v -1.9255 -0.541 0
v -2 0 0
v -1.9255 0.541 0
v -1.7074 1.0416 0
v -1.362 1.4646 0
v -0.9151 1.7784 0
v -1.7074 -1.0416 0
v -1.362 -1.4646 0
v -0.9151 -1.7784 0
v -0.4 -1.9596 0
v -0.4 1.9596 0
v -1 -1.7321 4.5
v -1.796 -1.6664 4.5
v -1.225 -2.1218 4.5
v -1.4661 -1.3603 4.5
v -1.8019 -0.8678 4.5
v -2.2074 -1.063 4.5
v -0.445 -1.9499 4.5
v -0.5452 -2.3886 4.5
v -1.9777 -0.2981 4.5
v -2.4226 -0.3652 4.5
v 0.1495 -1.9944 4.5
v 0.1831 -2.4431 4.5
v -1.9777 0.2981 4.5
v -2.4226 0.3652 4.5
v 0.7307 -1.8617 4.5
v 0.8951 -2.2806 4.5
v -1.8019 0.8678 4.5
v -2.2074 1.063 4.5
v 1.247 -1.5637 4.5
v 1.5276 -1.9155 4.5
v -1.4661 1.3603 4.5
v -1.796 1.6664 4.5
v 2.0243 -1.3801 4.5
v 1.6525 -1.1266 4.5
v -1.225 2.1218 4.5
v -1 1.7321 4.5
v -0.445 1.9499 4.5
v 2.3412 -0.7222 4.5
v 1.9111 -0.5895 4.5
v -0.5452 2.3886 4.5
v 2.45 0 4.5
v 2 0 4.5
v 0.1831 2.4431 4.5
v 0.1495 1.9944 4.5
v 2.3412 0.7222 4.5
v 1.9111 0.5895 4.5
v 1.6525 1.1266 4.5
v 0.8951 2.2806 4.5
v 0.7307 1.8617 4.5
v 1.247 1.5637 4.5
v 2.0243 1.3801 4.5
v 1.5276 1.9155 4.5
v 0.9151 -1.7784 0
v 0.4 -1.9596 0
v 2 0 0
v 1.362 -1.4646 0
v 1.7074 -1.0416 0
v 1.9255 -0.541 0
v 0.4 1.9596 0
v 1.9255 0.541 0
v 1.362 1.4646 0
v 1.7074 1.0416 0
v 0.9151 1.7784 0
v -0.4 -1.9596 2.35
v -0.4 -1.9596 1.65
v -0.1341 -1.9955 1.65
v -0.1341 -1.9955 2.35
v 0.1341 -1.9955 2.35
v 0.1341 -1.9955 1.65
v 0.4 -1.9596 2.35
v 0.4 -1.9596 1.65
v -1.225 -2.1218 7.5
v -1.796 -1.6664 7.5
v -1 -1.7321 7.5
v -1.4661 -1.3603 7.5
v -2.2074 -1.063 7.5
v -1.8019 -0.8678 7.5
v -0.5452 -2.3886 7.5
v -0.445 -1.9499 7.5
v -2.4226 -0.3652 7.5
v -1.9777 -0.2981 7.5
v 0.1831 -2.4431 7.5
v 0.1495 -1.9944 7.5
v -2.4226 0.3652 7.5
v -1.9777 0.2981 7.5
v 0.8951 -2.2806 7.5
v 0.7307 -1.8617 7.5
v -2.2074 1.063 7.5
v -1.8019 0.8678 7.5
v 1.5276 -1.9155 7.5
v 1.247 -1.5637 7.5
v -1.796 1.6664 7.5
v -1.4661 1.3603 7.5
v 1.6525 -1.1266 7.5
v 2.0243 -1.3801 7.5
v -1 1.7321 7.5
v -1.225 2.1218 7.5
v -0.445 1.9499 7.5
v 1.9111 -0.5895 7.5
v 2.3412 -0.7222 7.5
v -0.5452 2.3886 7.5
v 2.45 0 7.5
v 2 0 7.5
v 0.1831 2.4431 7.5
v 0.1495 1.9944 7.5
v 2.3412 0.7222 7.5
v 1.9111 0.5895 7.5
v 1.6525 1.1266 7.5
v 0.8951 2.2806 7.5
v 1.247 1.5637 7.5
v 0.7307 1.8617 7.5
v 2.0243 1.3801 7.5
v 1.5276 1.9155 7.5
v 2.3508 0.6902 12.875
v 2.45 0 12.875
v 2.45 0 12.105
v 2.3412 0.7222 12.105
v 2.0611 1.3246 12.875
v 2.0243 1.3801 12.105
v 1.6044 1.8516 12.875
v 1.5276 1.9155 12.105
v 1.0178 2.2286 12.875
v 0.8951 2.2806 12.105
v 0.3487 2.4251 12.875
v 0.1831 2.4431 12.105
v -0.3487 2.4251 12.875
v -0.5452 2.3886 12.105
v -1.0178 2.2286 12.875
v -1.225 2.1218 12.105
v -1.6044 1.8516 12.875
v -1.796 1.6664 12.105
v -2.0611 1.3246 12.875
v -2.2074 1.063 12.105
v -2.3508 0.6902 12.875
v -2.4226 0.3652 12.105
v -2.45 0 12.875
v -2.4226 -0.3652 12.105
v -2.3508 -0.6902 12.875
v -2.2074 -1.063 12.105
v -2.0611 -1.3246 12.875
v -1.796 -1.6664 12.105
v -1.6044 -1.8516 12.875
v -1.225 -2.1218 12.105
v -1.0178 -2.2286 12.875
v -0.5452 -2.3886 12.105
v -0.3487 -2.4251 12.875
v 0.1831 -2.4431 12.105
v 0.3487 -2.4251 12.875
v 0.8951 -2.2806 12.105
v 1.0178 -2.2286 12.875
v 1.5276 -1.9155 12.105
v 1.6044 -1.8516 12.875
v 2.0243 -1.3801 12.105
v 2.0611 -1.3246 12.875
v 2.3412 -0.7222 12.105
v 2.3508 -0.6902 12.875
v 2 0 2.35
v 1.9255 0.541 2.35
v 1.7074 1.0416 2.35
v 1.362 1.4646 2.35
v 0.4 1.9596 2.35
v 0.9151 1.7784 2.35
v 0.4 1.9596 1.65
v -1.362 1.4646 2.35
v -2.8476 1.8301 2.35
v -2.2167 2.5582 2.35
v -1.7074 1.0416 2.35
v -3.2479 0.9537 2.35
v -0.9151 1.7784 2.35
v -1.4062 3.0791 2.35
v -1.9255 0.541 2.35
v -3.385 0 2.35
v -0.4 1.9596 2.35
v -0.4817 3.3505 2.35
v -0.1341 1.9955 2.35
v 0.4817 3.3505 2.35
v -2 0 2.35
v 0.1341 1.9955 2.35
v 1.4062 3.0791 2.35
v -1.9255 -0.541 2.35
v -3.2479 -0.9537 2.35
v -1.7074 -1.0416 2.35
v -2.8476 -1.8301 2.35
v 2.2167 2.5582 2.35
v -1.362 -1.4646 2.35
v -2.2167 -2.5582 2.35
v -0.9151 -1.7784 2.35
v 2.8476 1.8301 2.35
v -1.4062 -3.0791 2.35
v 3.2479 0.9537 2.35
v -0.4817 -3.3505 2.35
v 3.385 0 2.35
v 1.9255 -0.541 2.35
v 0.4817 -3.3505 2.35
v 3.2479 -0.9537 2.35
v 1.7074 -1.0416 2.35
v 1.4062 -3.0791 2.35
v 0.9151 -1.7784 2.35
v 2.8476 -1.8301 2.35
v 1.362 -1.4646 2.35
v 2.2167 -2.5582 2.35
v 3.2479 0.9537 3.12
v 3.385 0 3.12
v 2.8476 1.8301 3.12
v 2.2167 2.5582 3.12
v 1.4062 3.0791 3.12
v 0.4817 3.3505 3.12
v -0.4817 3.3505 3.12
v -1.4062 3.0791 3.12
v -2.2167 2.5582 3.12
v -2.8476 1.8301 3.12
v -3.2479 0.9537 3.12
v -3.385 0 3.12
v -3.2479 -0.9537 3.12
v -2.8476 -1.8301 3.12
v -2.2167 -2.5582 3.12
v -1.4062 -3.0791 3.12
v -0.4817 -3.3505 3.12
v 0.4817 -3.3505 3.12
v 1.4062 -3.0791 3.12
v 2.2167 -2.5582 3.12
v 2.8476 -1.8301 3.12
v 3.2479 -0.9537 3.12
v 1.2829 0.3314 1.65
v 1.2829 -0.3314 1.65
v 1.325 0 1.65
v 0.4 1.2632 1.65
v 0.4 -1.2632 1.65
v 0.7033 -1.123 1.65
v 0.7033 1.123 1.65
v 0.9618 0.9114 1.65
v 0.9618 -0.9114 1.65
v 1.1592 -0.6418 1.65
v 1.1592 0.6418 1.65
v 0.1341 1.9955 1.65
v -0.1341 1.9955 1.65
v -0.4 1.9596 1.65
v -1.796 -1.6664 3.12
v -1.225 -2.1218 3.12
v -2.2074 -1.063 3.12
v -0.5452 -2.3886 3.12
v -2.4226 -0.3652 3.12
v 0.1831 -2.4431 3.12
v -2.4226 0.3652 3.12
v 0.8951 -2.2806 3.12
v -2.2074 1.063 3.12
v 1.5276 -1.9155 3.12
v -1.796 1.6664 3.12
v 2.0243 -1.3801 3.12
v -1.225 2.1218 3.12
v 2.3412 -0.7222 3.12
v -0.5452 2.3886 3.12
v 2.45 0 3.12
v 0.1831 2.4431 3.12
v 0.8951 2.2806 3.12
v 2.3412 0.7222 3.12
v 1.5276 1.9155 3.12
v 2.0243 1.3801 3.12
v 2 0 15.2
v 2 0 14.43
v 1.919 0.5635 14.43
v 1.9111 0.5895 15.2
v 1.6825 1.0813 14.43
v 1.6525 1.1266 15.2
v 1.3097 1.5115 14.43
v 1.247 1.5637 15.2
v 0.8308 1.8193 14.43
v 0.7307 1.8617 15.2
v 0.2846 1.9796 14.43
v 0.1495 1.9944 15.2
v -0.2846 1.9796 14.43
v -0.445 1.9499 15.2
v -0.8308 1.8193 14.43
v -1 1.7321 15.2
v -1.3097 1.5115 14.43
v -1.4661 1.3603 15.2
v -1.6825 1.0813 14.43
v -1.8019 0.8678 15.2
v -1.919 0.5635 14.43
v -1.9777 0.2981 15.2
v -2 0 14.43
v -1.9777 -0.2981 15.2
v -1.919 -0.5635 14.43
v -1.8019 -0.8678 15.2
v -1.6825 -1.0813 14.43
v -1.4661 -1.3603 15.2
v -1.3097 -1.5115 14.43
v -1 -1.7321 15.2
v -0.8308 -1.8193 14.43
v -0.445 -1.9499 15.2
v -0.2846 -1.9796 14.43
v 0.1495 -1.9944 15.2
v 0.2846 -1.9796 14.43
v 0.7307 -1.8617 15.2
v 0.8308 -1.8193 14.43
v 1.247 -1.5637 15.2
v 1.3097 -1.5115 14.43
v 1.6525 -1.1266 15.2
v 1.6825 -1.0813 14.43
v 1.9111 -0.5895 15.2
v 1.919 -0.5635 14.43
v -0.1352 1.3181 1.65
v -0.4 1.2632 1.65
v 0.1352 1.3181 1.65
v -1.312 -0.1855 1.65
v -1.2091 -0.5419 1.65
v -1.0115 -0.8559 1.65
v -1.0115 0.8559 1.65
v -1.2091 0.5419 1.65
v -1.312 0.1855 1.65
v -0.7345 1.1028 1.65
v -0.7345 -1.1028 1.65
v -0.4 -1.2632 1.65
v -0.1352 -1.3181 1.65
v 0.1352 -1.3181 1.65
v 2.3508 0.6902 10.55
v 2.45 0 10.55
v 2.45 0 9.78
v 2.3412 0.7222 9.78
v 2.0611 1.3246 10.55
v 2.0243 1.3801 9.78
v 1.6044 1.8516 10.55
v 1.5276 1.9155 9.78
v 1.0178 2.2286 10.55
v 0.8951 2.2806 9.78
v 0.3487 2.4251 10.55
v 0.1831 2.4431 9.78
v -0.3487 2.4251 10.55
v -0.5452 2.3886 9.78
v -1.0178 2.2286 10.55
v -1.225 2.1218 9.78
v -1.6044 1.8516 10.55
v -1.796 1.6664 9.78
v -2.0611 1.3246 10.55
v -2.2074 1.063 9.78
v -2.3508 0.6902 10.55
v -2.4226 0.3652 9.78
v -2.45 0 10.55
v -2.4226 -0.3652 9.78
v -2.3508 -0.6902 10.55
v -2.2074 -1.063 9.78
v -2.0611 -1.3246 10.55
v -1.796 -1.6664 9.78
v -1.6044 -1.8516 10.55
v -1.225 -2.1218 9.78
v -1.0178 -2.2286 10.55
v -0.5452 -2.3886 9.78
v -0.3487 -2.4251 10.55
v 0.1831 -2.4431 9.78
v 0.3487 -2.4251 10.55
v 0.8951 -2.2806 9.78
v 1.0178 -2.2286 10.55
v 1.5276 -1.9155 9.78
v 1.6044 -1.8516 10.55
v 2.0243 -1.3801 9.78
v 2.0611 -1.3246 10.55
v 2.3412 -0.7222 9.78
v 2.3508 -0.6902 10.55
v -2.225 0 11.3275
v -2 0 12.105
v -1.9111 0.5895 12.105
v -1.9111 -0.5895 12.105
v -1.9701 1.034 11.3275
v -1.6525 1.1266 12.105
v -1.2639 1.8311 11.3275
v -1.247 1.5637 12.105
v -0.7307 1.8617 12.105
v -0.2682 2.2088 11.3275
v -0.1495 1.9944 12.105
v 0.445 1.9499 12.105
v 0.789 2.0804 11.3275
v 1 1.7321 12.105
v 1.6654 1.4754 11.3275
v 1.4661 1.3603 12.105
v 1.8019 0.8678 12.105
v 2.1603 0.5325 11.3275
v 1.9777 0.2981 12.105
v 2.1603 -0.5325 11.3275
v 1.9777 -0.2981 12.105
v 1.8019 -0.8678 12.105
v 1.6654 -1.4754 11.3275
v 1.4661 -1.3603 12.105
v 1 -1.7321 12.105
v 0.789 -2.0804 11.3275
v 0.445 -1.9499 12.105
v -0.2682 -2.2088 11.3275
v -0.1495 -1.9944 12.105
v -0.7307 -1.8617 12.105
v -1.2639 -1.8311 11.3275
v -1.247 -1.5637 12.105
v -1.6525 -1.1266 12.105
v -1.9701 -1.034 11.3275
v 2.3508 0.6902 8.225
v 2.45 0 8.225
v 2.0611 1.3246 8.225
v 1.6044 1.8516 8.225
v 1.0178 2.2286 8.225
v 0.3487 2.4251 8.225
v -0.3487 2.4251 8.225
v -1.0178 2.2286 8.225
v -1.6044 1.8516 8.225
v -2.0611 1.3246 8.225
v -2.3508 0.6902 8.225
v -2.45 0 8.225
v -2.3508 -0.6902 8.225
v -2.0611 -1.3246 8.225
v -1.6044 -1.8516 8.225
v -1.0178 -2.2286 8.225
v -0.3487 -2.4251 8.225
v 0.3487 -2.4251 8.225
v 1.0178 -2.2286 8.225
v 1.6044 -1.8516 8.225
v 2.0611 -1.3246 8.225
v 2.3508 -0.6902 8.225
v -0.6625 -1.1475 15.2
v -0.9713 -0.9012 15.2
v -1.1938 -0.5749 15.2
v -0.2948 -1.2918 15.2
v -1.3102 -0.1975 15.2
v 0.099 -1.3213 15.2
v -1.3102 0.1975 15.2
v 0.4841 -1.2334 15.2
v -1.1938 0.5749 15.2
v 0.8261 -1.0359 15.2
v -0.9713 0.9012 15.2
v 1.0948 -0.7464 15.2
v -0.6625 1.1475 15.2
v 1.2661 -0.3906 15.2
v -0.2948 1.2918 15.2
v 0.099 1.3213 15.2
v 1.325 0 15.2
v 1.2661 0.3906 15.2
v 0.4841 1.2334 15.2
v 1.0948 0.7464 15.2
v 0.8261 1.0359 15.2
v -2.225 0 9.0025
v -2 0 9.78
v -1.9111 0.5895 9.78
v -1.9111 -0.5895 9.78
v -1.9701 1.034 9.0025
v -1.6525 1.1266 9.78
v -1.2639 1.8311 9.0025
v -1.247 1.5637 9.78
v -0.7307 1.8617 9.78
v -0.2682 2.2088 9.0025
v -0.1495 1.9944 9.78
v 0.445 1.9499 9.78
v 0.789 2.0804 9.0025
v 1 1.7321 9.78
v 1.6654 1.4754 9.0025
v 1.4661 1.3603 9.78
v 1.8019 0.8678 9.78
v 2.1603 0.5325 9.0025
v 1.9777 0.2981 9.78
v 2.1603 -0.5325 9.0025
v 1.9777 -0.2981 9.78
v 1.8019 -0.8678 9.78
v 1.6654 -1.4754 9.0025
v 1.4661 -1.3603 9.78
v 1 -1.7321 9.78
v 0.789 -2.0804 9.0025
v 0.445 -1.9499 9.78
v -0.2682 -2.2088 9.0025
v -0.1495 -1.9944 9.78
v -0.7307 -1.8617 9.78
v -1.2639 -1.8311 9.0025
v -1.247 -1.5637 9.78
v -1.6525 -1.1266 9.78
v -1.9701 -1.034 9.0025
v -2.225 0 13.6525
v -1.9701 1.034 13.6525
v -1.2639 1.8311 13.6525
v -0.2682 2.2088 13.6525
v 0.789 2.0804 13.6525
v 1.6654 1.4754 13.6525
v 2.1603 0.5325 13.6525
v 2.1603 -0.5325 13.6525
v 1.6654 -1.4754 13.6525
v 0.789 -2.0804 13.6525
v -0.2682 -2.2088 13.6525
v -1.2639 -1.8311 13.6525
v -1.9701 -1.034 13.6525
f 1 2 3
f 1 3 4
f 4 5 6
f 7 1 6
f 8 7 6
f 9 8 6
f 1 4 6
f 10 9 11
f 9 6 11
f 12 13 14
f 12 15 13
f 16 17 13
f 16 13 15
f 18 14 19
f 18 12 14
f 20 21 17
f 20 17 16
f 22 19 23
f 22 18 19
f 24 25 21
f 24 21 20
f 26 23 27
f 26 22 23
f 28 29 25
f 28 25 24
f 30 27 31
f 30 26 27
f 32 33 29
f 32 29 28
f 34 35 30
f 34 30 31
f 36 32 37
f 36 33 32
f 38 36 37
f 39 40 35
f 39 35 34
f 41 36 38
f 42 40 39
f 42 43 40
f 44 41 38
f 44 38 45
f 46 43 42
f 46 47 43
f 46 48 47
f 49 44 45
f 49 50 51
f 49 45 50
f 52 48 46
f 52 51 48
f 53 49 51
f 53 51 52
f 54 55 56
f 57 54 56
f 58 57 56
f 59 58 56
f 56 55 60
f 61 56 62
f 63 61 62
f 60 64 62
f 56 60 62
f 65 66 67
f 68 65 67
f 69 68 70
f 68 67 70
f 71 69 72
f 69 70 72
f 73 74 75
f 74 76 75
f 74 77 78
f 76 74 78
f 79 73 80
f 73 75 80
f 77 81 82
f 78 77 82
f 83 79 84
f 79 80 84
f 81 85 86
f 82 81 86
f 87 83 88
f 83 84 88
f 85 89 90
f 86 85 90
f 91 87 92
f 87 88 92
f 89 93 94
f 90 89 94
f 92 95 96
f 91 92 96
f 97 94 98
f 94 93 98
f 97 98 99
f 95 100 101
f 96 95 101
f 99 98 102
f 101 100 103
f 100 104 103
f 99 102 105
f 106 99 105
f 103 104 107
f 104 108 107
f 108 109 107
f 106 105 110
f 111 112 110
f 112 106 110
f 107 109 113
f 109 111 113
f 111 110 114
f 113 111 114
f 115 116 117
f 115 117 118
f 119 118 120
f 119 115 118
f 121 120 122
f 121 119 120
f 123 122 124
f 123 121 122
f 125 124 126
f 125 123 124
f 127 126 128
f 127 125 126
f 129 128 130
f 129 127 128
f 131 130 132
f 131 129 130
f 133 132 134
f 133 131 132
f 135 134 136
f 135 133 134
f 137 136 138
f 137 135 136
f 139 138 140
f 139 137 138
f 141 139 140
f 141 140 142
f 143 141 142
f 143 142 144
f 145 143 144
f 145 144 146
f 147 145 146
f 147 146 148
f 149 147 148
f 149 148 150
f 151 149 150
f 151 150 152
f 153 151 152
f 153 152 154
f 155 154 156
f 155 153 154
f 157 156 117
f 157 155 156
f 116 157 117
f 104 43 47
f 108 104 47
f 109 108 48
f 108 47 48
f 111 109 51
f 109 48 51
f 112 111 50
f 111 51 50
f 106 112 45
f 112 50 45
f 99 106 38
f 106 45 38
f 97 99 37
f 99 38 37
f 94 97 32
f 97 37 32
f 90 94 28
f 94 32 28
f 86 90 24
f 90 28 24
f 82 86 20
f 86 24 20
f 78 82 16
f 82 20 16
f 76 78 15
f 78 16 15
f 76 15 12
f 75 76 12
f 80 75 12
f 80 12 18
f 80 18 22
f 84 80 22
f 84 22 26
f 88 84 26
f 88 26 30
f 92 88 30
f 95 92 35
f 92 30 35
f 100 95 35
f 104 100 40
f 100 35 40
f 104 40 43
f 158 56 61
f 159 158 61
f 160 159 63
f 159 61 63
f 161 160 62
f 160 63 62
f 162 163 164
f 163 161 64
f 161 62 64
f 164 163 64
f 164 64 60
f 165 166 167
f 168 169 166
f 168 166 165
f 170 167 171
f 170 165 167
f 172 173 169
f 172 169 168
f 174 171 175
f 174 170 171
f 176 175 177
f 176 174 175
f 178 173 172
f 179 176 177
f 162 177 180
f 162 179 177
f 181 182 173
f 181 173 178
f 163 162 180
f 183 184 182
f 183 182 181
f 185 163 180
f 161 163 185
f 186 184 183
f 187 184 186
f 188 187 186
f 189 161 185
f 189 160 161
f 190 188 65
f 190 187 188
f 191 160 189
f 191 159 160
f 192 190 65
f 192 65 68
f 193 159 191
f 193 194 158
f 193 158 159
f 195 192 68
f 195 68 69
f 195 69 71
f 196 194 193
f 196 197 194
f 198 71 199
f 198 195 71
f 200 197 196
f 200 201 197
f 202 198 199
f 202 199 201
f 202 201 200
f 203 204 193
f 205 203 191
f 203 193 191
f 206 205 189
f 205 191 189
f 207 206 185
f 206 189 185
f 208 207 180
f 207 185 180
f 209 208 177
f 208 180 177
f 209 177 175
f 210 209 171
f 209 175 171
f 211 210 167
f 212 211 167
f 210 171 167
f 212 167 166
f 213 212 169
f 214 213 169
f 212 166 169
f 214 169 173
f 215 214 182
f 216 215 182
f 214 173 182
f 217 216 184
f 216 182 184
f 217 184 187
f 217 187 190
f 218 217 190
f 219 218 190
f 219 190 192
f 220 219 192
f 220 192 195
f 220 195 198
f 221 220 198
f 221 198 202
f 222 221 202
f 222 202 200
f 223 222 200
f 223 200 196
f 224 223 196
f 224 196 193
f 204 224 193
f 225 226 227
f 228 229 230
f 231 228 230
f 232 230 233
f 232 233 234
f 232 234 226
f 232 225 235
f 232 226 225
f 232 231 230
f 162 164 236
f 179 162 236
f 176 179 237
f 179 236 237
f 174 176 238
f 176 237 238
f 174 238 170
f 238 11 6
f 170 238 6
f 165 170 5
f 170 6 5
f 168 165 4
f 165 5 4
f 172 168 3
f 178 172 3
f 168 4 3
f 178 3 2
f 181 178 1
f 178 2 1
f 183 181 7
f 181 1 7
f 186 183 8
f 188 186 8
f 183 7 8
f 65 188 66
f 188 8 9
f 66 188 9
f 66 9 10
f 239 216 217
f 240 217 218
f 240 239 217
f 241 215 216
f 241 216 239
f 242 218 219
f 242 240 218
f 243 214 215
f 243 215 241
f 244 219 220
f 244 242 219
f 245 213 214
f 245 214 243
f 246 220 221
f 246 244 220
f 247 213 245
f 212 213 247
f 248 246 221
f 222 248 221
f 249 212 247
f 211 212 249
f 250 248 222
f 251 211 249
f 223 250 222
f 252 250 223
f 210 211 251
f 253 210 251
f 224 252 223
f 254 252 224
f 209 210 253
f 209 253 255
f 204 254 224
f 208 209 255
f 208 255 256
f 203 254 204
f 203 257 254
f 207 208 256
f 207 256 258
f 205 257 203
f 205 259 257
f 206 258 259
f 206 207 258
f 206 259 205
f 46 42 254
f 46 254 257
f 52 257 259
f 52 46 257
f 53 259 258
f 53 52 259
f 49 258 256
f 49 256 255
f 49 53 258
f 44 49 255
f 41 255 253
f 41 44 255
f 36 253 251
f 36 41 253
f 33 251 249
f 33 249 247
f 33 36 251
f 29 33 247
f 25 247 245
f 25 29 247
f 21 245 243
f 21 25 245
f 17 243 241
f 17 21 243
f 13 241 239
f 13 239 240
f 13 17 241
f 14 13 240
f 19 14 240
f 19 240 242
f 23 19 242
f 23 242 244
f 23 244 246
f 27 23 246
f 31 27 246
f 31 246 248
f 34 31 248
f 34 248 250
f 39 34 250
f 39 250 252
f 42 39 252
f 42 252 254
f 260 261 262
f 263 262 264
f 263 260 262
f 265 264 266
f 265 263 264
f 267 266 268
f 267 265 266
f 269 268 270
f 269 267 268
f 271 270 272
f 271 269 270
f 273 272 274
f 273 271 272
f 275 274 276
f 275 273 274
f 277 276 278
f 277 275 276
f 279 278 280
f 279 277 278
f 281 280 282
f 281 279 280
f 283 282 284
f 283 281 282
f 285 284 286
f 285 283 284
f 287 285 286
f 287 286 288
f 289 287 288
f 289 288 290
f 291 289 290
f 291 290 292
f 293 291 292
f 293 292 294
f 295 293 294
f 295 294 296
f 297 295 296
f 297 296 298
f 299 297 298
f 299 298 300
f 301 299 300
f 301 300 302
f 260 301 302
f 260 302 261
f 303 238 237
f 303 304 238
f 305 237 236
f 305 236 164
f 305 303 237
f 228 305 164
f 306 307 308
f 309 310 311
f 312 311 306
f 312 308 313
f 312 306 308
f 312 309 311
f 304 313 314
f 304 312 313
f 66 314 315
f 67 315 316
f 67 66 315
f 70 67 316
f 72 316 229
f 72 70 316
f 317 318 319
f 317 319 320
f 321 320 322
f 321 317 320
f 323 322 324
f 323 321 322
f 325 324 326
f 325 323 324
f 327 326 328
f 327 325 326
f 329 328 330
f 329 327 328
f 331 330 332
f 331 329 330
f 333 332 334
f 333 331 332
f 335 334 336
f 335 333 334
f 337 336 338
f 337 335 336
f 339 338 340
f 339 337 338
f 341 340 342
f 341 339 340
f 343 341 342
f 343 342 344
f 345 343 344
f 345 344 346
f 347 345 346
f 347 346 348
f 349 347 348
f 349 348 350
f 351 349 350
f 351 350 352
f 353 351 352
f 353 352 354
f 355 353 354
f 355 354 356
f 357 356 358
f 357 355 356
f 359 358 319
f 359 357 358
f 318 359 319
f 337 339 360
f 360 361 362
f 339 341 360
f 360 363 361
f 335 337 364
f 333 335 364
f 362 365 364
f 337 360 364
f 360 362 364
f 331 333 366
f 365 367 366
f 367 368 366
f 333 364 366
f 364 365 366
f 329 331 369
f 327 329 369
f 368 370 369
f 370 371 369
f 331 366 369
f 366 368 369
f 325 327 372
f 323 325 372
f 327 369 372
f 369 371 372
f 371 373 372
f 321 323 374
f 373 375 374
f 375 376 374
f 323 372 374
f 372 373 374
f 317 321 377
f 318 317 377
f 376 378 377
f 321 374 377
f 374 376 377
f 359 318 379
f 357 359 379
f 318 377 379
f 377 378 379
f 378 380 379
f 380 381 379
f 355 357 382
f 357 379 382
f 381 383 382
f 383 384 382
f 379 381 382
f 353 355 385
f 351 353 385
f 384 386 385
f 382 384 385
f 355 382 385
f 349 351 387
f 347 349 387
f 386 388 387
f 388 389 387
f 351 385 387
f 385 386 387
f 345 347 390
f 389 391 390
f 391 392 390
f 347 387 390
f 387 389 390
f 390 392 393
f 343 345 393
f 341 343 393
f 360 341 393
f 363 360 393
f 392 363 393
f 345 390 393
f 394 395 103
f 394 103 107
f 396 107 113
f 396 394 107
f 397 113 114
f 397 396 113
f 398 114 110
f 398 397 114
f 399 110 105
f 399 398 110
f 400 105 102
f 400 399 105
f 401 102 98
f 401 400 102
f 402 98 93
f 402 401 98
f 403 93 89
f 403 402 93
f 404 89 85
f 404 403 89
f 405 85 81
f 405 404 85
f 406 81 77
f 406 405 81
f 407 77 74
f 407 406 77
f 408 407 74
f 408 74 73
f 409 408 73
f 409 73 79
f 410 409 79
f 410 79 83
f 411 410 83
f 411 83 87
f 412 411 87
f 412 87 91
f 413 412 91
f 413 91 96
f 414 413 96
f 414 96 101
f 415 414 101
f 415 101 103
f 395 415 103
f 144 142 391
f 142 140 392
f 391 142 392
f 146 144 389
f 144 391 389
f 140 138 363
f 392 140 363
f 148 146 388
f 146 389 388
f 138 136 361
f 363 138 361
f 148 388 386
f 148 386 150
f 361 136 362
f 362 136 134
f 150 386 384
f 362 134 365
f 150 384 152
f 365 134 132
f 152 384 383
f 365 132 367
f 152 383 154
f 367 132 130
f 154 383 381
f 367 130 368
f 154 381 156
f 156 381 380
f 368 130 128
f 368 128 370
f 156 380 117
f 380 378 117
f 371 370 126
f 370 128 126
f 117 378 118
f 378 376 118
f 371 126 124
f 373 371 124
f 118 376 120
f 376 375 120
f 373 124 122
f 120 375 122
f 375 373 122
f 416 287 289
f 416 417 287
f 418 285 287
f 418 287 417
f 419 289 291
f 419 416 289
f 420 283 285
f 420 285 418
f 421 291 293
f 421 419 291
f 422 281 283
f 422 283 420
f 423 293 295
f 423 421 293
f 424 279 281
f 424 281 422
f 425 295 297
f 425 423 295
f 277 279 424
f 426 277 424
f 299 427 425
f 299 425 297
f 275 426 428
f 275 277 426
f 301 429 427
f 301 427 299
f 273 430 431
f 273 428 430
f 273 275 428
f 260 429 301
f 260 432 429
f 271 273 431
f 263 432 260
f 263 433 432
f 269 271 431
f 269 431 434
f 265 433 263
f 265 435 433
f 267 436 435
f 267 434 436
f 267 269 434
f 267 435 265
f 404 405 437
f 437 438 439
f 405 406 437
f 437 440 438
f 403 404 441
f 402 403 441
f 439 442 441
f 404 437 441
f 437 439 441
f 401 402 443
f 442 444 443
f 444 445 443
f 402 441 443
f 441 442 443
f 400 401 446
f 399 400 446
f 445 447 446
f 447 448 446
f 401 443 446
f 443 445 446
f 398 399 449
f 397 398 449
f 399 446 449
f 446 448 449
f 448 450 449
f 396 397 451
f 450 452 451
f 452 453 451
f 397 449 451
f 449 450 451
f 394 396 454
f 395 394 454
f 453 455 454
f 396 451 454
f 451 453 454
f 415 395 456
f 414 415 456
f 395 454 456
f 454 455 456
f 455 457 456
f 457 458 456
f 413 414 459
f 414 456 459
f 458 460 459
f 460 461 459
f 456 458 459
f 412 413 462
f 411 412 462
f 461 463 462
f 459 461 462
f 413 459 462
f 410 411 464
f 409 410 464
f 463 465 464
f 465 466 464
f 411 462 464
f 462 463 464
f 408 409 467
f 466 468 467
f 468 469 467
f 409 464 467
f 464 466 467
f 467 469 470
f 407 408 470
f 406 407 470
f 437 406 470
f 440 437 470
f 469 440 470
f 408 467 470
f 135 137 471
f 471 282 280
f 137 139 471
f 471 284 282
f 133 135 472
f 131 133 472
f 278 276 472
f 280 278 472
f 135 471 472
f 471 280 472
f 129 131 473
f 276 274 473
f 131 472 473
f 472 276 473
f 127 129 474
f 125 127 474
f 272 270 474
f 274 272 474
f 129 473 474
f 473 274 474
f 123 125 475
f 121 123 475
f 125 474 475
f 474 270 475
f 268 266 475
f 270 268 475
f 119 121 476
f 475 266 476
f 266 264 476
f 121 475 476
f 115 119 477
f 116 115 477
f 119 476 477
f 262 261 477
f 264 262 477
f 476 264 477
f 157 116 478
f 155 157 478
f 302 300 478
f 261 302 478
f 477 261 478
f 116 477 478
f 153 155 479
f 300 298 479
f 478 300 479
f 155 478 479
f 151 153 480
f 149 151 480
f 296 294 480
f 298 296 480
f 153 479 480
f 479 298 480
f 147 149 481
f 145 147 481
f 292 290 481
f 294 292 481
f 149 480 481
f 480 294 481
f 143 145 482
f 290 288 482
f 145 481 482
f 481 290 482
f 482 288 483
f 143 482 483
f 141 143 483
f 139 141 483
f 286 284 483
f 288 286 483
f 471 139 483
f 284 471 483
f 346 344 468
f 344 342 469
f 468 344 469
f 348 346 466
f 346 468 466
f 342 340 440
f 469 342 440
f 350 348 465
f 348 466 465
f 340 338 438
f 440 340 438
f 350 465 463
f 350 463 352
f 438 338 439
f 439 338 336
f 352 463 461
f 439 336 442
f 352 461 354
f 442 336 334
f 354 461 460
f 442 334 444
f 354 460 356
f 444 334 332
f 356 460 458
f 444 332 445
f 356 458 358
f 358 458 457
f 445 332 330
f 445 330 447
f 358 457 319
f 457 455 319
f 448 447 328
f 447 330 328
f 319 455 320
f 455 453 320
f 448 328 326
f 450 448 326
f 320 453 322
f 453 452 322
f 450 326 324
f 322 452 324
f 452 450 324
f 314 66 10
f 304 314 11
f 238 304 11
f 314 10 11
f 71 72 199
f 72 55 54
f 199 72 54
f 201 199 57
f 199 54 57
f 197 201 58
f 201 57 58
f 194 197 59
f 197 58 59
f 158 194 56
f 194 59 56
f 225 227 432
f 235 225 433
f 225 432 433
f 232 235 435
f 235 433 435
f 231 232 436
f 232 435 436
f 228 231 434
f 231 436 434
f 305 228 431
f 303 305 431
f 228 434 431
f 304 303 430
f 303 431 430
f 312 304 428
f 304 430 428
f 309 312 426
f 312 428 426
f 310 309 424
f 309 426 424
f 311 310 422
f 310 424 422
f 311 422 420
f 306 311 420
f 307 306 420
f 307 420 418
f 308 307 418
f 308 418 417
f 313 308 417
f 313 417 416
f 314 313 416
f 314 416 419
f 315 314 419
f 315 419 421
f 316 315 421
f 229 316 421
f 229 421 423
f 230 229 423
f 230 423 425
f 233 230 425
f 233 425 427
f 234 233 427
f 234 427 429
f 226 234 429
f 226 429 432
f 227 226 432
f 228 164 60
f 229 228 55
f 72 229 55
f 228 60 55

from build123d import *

# Parameters (mm, degrees)
F0_R      = 3.385
F1_DEPTH  = 15.2
F2_R      = 3.385
F3_DEPTH  = 2.35
F4_DEPTH  = 1.65
F6_R      = 3.385
F6_R_2    = 2.45
F7_DEPTH  = 12.08
F9_R      = 3.385
F9_R_2    = 2
F10_DEPTH = 3
F11_R     = 2.45
F11_R_2   = 2
F12_DEPTH = 0.77
F31_R     = 1.325
F32_DEPTH = 13.55


with BuildPart() as f1:
    # F0 (on Top) → F1 (new body)
    with BuildSketch(Plane.XY):
        Circle(F0_R)
    extrude(amount=F1_DEPTH)

    # F2 (on face) → F3 (cut)
    with BuildSketch(Plane(origin=(0, 0, 0), x_dir=(1, 0, 0), z_dir=(0, 0, -1))):
        Circle(F2_R)
        with BuildLine():
            ThreePointArc((0.4, 1.9595917942), (1.5491933385, 1.2649110641), (2, 0))
            ThreePointArc((2, 0), (1.5491933385, -1.2649110641), (0.4, -1.9595917942))
            ThreePointArc((0.4, -1.9595917942), (0, -2), (-0.4, -1.9595917942))
            ThreePointArc((-0.4, -1.9595917942), (-2, 0), (-0.4, 1.9595917942))
            ThreePointArc((-0.4, 1.9595917942), (0, 2), (0.4, 1.9595917942))
        make_face(mode=Mode.SUBTRACT)
    extrude(amount=-F3_DEPTH, mode=Mode.SUBTRACT)

    # F2 (on face) → F4 (cut)
    with BuildSketch(Plane(origin=(0, 0, 0), x_dir=(1, 0, 0), z_dir=(0, 0, -1))):
        with BuildLine():
            Line((0.4, -1.9595917942), (0.4, 1.9595917942))
            ThreePointArc((0.4, 1.9595917942), (0, 2), (-0.4, 1.9595917942))
            Line((-0.4, 1.9595917942), (-0.4, -1.9595917942))
            ThreePointArc((-0.4, -1.9595917942), (0, -2), (0.4, -1.9595917942))
        make_face()
    extrude(amount=-F4_DEPTH, mode=Mode.SUBTRACT)

    # F6 (on face) → F7 (cut, through all)
    with BuildSketch(Plane.XY.offset(15.2)):
        Circle(F6_R)
        Circle(F6_R_2, mode=Mode.SUBTRACT)
    extrude(amount=-F7_DEPTH, mode=Mode.SUBTRACT)

    # F9 (on offset) → F10 (cut)
    with BuildSketch(Plane.XY.offset(4.5)):
        Circle(F9_R)
        Circle(F9_R_2, mode=Mode.SUBTRACT)
    extrude(amount=F10_DEPTH, mode=Mode.SUBTRACT)

    # F11 (on face) → F12 (cut)
    with BuildSketch(Plane.XY.offset(15.2)):
        Circle(F11_R)
        Circle(F11_R_2, mode=Mode.SUBTRACT)
    extrude(amount=-F12_DEPTH, mode=Mode.SUBTRACT)

    # F20 (on Front) → F28 (revolve, cut)
    with BuildSketch(Plane.XZ):
        Polygon((-2.45, 14.43), (-2.45, 12.875), (-2, 14.43), align=None)
    revolve(axis=Axis((0, 0, 10.2299177088), (0, 0, -1)), mode=Mode.SUBTRACT)

    # F23 (on Front) → F29 (revolve, cut)
    with BuildSketch(Plane.XZ):
        Polygon((-2.45, 12.105), (-2.45, 10.55), (-2, 12.105), align=None)
    revolve(axis=Axis((0, 0, 10.2299177088), (0, 0, -1)), mode=Mode.SUBTRACT)

    # F26 (on Front) → F30 (revolve, cut)
    with BuildSketch(Plane.XZ):
        Polygon((-2.45, 9.78), (-2.45, 8.225), (-2, 9.78), align=None)
    revolve(axis=Axis((0, 0, 10.2299177088), (0, 0, -1)), mode=Mode.SUBTRACT)

    # F31 (on face) → F32 (cut, through all)
    with BuildSketch(Plane.XY.offset(15.2)):
        Circle(F31_R)
    extrude(amount=-F32_DEPTH, mode=Mode.SUBTRACT)


solid = f1.part
